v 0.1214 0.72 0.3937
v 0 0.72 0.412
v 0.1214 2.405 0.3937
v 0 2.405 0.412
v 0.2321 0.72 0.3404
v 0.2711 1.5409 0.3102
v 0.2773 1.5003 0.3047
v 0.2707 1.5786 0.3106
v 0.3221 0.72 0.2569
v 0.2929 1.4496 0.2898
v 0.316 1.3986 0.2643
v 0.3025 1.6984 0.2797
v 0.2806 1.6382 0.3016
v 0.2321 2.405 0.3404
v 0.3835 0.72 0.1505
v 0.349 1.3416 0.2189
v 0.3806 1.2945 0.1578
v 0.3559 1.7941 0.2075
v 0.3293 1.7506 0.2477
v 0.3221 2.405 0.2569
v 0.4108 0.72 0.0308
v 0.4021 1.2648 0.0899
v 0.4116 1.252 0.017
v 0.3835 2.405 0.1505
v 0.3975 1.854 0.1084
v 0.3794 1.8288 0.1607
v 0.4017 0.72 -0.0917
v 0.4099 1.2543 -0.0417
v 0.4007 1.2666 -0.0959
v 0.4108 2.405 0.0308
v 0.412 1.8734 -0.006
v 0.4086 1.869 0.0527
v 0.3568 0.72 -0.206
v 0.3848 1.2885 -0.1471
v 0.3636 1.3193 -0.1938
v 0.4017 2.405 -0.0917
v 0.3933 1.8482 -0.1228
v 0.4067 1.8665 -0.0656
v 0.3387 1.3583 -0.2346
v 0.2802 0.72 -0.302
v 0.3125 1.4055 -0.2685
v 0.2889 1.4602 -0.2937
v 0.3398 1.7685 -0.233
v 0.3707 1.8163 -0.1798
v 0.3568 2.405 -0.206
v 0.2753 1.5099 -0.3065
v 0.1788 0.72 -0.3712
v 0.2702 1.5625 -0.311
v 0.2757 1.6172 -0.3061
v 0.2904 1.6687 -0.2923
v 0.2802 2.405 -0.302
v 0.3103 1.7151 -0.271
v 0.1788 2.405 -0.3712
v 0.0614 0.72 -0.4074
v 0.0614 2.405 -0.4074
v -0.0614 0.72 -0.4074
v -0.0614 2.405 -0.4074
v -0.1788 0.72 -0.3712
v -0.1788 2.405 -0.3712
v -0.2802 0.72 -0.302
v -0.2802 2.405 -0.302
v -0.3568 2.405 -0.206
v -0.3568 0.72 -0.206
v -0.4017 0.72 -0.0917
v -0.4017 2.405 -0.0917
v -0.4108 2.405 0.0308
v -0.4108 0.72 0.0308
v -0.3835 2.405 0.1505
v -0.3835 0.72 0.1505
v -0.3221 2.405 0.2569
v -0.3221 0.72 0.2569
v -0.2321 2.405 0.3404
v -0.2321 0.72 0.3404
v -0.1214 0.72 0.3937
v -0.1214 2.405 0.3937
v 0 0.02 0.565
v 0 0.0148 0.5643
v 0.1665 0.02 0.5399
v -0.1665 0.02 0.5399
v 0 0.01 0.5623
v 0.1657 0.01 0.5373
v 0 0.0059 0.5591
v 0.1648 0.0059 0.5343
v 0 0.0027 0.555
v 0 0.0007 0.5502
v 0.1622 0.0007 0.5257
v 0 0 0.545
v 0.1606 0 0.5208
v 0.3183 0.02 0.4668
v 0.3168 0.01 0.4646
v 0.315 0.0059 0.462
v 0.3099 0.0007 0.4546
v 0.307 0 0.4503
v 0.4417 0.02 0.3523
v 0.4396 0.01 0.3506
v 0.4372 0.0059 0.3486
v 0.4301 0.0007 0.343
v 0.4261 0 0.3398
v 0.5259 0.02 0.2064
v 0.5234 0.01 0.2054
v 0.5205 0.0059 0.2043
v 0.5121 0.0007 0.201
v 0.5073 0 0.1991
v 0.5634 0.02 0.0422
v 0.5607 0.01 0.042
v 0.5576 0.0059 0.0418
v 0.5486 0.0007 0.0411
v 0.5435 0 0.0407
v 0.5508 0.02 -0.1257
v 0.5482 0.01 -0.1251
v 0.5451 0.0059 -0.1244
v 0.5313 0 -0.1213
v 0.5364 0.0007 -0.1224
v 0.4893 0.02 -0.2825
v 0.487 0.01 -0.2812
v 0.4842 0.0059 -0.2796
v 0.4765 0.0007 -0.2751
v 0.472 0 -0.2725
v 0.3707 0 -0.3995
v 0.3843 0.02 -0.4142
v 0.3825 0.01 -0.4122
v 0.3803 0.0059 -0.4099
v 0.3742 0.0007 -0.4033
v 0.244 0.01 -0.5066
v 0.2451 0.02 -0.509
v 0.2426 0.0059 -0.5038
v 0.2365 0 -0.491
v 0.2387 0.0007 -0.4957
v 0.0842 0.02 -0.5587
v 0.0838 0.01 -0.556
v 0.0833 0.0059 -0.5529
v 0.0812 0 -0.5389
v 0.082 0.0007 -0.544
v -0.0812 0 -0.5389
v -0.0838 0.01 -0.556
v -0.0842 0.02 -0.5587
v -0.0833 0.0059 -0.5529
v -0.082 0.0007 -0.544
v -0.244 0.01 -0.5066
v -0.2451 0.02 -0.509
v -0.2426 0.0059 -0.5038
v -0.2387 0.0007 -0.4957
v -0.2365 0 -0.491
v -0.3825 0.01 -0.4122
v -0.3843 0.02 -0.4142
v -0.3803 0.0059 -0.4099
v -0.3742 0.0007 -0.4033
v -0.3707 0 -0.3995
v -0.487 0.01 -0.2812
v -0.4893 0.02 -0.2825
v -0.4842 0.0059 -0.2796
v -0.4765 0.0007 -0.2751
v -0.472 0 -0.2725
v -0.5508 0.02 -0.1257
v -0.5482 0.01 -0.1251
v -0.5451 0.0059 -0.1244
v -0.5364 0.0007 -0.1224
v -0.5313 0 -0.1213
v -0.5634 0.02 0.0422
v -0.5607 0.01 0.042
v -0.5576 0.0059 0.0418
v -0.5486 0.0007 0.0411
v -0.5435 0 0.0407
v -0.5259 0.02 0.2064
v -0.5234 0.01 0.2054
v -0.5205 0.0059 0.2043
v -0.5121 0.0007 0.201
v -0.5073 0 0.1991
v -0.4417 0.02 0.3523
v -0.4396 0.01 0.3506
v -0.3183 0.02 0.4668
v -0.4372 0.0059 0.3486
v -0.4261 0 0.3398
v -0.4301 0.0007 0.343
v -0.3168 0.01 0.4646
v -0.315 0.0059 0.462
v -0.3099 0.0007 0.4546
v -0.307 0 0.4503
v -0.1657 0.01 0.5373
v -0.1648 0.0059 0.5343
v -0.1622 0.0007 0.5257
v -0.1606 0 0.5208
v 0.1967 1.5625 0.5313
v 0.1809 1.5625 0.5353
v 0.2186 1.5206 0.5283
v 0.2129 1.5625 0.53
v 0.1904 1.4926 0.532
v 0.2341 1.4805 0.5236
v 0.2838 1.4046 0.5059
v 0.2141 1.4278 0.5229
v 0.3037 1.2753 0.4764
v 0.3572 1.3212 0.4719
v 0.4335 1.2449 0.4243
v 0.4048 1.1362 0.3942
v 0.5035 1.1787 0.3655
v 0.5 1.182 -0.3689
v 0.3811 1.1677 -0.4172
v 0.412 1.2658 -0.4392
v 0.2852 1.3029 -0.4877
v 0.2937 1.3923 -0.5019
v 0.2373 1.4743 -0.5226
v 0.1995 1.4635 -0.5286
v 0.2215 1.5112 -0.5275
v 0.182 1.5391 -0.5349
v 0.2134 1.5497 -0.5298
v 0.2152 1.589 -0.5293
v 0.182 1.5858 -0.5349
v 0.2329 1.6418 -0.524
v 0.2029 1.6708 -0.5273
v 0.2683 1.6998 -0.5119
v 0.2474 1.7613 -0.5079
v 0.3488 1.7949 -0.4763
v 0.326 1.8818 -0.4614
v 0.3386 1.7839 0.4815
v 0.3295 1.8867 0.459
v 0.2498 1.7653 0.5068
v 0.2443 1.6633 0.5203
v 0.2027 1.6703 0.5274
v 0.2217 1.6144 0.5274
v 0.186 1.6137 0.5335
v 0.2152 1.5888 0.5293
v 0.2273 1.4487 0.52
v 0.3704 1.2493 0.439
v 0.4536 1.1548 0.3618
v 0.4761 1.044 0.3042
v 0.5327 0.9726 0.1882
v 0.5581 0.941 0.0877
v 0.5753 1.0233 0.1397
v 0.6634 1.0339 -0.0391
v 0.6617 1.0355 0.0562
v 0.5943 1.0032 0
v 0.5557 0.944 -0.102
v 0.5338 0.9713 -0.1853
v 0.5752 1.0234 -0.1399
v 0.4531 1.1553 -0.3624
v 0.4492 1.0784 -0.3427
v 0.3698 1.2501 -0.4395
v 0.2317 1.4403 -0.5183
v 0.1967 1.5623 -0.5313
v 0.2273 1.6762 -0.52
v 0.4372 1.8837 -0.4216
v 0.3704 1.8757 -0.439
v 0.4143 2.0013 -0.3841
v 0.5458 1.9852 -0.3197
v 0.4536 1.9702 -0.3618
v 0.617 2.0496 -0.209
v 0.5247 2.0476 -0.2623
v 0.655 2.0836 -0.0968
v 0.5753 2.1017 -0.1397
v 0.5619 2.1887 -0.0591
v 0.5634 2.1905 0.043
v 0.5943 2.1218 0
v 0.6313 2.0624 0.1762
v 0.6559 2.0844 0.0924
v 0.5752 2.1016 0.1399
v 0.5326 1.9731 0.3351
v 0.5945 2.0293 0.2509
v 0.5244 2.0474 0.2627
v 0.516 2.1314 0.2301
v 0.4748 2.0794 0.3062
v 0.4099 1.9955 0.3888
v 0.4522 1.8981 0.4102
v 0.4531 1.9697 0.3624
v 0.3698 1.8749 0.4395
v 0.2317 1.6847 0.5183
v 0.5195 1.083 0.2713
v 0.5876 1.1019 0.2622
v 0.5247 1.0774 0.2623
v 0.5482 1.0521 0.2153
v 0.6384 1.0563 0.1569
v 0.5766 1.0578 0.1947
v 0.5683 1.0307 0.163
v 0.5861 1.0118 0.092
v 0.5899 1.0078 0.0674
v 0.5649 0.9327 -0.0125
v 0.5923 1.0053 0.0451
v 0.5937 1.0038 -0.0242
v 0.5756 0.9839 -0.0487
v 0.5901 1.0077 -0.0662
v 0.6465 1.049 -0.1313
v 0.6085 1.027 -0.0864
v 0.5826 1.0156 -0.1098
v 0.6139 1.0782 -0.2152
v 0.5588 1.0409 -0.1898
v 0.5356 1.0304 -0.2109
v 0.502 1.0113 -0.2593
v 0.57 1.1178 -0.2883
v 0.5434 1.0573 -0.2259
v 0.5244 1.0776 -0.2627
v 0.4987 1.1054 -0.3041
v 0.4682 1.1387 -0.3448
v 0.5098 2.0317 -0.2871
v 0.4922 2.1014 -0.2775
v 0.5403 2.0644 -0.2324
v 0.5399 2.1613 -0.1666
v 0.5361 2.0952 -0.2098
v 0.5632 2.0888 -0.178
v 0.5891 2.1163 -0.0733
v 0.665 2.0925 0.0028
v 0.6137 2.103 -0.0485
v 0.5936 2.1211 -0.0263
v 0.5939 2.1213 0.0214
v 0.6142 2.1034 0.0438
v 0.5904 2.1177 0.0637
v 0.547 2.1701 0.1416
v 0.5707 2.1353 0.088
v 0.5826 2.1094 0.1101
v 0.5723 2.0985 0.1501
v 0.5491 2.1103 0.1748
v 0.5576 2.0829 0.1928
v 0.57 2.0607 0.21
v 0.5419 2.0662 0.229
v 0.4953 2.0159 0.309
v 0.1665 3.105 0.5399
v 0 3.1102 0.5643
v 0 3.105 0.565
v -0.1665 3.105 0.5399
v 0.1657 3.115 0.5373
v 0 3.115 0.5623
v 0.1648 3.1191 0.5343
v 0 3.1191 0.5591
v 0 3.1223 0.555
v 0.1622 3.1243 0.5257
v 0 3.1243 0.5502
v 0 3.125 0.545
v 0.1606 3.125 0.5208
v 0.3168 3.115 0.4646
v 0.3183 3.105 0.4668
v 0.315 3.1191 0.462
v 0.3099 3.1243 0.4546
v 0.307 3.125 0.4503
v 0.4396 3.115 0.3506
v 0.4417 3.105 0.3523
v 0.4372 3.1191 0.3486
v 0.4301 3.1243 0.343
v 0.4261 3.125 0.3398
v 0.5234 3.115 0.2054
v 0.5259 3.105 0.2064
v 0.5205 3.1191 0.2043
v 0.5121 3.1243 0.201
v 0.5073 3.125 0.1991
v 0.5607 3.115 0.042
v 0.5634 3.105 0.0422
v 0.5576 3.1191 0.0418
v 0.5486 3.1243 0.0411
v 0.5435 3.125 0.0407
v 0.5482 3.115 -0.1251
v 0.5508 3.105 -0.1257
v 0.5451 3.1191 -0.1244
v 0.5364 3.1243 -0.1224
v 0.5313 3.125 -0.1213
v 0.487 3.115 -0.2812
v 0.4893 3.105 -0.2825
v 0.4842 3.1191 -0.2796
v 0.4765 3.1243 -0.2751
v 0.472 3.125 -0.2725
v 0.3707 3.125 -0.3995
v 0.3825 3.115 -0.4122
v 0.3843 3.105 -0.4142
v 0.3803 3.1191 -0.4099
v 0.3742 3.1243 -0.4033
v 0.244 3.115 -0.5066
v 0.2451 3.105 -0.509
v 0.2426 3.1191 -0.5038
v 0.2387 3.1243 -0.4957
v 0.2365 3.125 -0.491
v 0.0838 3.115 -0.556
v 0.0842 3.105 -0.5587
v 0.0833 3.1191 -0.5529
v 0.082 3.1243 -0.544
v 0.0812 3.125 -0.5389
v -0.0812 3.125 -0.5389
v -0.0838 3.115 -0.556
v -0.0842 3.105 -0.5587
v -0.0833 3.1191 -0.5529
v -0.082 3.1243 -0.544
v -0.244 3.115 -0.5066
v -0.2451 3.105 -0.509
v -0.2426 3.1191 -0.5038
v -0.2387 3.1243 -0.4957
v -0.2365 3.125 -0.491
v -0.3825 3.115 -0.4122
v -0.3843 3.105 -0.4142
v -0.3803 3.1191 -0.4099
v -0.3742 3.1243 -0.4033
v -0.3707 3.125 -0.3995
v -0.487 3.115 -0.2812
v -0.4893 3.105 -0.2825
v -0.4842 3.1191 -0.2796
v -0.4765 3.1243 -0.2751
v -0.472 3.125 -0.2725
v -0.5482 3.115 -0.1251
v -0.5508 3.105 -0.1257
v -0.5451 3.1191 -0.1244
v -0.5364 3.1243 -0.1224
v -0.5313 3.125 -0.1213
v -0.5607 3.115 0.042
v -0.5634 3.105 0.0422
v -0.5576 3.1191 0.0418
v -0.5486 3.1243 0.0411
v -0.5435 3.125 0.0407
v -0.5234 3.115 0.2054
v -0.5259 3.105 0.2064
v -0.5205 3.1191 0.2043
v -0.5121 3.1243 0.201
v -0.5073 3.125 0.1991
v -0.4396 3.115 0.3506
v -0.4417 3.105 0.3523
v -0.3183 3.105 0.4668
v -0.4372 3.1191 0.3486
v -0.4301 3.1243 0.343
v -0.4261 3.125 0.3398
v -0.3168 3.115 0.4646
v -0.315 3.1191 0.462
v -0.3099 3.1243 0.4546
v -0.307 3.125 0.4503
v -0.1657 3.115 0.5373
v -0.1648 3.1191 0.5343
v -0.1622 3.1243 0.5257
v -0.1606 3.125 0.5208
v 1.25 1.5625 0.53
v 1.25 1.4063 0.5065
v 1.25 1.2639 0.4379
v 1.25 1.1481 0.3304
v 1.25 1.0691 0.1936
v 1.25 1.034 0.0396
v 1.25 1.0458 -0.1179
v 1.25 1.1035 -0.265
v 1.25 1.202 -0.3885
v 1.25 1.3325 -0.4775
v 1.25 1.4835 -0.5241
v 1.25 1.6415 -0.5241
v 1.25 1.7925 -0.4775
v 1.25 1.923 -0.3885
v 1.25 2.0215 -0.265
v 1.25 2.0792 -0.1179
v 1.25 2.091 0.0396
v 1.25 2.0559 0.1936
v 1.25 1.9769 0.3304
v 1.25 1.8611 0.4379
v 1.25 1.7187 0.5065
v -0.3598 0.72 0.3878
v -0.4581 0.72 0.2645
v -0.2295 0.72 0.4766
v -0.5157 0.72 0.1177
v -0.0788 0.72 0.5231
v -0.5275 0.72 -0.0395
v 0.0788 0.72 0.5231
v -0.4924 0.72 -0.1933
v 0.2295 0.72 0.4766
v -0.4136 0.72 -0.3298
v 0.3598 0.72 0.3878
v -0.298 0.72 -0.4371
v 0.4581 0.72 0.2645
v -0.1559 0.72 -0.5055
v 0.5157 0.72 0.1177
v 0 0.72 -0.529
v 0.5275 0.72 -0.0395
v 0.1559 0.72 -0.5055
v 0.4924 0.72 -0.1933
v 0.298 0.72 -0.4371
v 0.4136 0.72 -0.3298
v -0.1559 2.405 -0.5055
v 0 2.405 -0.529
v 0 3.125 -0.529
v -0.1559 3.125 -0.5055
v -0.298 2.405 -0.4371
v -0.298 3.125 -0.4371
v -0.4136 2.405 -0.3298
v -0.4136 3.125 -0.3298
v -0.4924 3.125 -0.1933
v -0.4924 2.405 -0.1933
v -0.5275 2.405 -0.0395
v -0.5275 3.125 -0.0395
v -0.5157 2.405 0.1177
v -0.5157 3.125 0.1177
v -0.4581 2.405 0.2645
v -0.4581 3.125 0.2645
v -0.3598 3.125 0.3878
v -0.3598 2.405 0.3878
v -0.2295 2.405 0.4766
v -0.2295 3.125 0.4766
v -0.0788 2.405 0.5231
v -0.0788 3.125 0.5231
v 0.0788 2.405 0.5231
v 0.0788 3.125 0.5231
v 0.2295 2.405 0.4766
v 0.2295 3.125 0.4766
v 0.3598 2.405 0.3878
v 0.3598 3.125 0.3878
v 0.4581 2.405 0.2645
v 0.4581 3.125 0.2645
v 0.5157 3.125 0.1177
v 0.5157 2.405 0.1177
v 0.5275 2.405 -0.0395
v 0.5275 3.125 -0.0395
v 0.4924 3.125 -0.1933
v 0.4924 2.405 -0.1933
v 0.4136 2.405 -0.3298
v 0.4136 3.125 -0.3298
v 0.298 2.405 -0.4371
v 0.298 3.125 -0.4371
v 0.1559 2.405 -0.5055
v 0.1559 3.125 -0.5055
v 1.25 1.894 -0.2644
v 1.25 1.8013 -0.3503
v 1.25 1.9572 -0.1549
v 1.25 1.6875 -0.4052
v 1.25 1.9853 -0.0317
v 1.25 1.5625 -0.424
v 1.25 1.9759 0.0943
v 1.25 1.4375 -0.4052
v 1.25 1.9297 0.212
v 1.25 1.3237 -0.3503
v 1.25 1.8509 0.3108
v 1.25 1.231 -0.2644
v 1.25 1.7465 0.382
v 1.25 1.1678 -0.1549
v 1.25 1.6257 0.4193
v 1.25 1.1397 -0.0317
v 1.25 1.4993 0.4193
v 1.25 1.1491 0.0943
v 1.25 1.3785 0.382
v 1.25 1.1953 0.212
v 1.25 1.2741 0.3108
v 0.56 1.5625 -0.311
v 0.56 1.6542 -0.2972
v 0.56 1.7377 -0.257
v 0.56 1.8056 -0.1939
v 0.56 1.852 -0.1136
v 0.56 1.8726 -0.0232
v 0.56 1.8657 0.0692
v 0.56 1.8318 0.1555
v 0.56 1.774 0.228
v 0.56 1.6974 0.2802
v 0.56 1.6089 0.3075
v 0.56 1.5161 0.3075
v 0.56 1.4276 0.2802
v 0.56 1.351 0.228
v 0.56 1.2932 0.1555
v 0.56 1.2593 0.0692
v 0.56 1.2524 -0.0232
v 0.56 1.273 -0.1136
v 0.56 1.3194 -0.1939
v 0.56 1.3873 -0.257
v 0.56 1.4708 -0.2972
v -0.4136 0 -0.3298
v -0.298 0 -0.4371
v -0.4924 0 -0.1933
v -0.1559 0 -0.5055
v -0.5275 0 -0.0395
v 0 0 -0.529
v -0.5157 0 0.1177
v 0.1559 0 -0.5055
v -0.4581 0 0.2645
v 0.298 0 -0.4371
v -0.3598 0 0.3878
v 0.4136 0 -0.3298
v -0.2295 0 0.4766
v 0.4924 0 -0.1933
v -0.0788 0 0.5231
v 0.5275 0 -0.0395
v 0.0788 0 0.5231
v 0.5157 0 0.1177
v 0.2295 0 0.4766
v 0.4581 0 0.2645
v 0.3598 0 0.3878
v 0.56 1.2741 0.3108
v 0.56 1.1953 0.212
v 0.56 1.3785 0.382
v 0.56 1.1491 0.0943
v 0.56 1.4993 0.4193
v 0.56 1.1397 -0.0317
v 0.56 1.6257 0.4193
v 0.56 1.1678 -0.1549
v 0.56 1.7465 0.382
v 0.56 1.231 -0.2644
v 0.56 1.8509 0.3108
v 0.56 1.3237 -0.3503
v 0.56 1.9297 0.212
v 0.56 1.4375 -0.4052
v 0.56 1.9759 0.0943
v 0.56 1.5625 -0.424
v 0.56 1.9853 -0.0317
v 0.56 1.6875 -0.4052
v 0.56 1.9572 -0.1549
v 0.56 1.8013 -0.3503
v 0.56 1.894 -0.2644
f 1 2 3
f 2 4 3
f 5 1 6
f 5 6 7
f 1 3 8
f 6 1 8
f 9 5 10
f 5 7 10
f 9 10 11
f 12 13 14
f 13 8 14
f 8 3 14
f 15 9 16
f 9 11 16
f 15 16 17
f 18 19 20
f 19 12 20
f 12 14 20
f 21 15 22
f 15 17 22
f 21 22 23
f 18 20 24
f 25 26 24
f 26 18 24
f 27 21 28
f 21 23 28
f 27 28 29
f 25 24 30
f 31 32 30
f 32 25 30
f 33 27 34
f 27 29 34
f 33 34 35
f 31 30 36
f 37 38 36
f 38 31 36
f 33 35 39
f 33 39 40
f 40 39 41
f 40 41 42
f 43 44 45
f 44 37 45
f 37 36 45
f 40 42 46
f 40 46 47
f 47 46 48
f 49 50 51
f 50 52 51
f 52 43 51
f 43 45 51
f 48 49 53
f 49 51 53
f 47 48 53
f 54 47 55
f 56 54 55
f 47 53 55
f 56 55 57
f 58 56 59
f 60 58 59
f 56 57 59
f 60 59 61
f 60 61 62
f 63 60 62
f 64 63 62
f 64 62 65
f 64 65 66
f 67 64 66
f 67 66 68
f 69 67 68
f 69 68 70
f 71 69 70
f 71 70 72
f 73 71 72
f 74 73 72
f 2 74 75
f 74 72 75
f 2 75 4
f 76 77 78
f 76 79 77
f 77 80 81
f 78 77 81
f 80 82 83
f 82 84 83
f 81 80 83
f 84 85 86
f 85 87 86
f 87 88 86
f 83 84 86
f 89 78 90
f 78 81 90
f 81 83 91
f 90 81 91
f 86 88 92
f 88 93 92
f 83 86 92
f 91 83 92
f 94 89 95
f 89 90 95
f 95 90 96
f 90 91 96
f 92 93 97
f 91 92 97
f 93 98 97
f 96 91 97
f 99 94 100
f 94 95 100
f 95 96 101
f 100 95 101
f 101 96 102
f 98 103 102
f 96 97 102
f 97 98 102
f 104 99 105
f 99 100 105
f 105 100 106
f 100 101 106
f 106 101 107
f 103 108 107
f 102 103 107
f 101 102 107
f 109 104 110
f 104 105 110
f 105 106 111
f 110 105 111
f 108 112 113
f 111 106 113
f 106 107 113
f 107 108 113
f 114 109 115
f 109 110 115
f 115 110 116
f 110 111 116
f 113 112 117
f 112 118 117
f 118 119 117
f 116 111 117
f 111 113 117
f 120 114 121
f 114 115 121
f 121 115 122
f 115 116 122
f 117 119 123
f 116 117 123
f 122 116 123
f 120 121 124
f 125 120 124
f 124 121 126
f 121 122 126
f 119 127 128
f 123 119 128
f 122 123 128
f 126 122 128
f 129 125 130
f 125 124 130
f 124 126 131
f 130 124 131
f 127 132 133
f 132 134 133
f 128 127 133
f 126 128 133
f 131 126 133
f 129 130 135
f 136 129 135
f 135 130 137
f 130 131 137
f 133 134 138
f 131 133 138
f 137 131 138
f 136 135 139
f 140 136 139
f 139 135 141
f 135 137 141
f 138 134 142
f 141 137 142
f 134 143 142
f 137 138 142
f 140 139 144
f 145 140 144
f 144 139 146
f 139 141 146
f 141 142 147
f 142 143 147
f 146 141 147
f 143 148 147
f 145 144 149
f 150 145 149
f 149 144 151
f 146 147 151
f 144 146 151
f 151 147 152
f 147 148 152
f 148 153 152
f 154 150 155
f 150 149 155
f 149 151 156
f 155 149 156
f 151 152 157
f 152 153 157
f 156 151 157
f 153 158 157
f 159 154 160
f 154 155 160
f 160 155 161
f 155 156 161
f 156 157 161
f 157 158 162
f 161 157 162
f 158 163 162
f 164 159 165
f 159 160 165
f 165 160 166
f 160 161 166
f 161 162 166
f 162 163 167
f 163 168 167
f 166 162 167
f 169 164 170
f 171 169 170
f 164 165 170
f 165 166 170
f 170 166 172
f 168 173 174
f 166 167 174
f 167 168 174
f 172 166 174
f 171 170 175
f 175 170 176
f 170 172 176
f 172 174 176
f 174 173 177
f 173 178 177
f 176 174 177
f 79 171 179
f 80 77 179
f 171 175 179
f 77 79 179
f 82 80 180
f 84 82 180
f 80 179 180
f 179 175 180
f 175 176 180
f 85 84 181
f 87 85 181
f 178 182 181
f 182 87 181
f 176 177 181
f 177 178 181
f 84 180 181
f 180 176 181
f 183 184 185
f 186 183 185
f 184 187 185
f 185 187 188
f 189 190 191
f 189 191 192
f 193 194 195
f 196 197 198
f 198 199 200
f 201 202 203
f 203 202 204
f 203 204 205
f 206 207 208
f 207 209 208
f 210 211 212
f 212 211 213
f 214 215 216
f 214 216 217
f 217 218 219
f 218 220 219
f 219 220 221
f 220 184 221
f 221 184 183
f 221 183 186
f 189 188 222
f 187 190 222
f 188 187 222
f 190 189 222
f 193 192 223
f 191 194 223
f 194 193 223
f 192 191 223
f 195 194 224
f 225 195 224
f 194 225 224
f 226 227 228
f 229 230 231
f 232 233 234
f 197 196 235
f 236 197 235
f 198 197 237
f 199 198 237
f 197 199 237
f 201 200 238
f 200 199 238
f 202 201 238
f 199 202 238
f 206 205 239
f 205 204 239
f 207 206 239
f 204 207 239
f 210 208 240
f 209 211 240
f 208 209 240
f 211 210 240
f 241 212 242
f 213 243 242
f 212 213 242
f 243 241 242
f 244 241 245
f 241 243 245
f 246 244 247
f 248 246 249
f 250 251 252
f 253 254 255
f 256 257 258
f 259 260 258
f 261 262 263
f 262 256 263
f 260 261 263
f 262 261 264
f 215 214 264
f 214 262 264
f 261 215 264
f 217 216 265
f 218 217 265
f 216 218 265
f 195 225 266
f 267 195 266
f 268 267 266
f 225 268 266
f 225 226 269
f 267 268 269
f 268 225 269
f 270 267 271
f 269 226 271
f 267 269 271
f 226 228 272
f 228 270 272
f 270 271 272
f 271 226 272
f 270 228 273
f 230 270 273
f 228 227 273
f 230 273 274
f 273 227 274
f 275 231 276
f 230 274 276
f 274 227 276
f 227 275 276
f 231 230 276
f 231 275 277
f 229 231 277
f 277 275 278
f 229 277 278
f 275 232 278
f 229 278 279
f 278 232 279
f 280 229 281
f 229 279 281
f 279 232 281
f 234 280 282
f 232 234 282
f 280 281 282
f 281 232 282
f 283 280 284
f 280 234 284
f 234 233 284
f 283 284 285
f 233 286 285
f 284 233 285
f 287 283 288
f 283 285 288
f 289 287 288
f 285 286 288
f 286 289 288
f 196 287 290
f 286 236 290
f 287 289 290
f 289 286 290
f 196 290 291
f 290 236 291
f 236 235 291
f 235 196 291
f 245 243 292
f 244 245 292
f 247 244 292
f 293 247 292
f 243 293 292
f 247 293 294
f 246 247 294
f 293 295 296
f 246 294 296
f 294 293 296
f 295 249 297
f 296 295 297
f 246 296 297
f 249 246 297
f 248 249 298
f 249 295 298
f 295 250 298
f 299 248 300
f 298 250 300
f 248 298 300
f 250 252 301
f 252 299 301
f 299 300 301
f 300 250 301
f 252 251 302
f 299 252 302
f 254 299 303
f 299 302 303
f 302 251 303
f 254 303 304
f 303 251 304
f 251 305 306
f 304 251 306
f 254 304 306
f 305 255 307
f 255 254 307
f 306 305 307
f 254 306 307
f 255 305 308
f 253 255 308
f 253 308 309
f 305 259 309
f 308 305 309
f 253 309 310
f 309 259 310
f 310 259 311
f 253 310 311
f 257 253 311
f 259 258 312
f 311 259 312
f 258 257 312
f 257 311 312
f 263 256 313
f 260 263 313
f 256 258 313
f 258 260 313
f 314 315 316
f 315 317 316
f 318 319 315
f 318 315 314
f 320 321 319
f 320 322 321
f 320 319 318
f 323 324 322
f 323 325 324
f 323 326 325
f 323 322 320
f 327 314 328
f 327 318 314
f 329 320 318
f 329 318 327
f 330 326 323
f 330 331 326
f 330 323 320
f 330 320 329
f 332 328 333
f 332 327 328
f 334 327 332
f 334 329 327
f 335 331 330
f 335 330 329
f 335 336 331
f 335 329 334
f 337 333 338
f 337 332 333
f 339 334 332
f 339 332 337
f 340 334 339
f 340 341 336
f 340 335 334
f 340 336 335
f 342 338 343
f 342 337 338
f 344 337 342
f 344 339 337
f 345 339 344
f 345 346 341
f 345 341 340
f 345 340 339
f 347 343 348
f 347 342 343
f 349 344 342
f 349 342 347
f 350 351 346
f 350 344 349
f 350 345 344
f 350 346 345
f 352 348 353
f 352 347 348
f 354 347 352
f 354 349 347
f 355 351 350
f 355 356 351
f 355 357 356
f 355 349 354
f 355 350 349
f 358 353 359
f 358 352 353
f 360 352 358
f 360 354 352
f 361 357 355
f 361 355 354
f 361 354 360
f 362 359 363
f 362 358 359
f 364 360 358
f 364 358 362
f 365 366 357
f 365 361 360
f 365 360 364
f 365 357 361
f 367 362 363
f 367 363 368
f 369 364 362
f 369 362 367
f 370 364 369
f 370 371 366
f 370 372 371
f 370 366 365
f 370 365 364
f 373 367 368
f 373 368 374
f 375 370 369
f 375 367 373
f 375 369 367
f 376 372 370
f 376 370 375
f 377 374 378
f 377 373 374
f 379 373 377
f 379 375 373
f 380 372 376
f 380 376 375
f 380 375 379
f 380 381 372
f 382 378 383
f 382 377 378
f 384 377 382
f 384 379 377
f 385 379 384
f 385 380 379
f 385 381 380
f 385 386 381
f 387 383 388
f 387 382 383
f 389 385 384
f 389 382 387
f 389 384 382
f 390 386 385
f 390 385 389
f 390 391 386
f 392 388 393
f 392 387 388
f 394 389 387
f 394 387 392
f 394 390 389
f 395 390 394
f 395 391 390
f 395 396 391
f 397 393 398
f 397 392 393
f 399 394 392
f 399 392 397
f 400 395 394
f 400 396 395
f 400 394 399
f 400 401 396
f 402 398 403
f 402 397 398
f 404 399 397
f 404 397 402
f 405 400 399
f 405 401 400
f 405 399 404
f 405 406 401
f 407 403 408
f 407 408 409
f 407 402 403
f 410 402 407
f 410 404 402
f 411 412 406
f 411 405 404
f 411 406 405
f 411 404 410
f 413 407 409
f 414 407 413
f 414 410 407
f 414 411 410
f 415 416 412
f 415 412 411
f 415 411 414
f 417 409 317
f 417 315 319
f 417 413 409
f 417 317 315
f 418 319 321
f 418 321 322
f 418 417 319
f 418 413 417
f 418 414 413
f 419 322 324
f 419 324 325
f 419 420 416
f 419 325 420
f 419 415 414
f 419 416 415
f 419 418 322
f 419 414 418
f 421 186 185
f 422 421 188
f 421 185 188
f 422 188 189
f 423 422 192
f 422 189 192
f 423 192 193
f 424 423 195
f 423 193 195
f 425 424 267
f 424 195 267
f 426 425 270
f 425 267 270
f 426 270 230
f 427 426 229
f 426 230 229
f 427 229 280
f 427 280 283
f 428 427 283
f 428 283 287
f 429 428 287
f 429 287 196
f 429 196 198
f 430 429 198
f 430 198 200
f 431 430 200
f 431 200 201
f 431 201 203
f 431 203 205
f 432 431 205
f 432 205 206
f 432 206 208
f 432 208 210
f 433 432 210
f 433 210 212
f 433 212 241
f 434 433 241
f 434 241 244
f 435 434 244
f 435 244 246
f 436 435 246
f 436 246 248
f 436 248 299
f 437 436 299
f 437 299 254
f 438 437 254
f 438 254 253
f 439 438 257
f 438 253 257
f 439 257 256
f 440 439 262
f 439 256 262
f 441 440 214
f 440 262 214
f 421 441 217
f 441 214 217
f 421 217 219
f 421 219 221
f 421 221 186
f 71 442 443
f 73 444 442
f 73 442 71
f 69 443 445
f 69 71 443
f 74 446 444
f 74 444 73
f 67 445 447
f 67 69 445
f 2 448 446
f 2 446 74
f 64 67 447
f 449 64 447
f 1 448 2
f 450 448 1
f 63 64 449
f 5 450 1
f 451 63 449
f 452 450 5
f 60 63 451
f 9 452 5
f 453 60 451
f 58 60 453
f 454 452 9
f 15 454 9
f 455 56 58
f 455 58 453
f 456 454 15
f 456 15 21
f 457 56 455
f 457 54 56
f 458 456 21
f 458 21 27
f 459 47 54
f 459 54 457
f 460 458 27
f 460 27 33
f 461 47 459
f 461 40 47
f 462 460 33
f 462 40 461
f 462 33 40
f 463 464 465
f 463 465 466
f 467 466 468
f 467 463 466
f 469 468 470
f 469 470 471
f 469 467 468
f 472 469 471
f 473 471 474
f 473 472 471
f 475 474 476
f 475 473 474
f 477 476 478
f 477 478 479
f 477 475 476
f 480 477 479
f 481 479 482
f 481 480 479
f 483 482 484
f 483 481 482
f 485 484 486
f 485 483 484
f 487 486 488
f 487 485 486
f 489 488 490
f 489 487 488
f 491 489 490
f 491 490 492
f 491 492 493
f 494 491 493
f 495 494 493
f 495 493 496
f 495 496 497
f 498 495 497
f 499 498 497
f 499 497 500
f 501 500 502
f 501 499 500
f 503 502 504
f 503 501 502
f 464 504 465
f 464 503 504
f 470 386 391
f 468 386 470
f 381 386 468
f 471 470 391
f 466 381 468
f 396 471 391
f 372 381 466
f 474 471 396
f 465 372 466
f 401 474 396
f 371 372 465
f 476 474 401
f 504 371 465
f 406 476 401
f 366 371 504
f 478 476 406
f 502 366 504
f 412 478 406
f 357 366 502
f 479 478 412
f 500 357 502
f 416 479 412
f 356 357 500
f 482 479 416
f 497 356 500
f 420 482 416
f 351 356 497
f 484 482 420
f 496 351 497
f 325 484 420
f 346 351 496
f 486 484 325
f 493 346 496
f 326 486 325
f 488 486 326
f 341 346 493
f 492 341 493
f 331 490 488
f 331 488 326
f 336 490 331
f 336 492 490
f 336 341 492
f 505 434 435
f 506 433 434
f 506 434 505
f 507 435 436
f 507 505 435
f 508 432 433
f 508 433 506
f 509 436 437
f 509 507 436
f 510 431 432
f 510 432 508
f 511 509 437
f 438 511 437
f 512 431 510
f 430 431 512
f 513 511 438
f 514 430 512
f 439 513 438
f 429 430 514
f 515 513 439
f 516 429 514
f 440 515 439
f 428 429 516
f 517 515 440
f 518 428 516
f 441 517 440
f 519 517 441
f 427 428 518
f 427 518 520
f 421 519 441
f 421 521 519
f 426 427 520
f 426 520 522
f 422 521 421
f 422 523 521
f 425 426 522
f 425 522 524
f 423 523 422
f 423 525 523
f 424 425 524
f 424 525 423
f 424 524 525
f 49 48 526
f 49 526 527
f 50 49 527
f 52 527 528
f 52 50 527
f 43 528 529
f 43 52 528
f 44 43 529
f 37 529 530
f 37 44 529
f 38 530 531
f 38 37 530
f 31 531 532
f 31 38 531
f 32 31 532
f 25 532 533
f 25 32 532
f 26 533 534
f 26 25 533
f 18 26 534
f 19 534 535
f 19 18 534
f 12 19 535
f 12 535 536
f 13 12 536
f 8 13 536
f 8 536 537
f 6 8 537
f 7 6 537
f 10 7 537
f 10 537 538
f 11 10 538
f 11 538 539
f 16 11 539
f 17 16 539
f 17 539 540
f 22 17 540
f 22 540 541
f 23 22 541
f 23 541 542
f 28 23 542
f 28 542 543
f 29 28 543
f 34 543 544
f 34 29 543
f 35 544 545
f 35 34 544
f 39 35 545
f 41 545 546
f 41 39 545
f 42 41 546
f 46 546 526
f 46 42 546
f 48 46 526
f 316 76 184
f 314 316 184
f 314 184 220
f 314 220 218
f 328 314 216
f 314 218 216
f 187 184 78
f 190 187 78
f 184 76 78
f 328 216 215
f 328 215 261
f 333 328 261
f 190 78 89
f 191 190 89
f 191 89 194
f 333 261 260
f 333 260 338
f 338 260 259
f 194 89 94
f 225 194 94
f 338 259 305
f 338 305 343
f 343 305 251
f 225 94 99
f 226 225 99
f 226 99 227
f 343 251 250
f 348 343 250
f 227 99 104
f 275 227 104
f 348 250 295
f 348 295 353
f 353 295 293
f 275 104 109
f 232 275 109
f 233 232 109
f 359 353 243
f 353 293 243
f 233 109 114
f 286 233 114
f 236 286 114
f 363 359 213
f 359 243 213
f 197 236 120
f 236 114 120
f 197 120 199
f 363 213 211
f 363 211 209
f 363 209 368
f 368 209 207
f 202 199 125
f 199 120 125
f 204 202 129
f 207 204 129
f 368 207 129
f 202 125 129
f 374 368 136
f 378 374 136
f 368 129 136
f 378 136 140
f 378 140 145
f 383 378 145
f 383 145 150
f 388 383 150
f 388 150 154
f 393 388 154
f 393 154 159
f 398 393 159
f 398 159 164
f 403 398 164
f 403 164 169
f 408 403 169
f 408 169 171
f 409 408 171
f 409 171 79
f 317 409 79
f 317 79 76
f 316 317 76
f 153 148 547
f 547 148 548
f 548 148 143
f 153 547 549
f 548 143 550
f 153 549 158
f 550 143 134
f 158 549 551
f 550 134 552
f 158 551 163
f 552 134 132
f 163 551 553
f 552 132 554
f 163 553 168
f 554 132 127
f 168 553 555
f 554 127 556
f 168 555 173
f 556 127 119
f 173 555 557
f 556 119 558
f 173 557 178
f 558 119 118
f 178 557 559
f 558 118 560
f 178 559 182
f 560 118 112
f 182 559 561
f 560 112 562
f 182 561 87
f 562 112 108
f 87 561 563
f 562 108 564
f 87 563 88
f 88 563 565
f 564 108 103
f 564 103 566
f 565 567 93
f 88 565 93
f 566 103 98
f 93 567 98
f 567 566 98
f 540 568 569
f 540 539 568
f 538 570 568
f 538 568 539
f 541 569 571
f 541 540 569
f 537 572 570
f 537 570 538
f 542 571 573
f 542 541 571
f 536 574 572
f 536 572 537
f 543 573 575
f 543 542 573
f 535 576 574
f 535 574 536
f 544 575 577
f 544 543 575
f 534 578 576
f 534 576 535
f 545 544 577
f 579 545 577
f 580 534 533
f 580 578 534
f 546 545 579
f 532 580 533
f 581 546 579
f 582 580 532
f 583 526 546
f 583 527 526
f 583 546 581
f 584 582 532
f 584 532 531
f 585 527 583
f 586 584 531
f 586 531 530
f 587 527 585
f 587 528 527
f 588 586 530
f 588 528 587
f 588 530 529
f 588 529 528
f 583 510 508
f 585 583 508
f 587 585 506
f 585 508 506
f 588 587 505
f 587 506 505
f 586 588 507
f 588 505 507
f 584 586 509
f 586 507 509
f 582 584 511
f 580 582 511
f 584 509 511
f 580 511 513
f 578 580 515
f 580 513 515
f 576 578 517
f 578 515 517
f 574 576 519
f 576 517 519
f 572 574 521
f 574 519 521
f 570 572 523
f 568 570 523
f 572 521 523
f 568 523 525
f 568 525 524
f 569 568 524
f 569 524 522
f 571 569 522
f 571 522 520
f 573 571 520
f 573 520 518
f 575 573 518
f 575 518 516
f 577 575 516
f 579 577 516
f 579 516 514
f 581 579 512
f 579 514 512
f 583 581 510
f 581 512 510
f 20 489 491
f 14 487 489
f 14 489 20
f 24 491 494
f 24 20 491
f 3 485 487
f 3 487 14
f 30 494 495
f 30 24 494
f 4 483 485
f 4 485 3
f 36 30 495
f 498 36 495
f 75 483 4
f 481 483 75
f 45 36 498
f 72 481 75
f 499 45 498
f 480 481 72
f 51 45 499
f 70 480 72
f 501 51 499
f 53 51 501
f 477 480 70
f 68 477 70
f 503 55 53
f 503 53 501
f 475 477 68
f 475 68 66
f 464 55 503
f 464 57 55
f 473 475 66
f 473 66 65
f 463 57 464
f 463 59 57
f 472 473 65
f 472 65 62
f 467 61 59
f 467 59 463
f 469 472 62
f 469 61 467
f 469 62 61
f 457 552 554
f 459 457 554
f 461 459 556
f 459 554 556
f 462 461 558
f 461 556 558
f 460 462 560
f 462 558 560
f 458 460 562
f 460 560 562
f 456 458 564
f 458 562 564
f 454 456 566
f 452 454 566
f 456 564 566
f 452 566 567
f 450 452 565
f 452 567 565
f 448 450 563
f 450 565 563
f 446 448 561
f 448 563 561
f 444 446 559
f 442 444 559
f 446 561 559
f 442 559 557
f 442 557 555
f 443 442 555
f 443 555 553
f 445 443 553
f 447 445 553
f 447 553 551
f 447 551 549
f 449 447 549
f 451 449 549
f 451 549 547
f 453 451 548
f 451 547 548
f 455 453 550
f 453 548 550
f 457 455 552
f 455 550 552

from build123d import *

# Parameters (mm, degrees)
SKETCH1_R           = 0.565
BOSS_EXTRUDE1_DEPTH = 3.125
SKETCH3_R           = 0.529
CUT_EXTRUDE2_DEPTH  = 0.72
CUT_EXTRUDE3_START  = -0.72
SKETCH4_R           = 0.529
CUT_EXTRUDE3_DEPTH  = 0.72
SKETCH5_R           = 0.53
BOSS_EXTRUDE2_DEPTH = 1.25
SKETCH6_R           = 0.311
CUT_EXTRUDE8_DEPTH  = 1.25
SKETCH9_R           = 0.424
CUT_EXTRUDE10_DEPTH = 0.69
SKETCH10_R          = 0.412
CUT_EXTRUDE12_DEPTH = 4.0625
FILLET1_R           = 0.02
FILLET2_R           = 0.1


with BuildPart() as part:
    # Sketch1 → Boss-Extrude1 (new body)
    with BuildSketch(Plane(origin=(0, 0, 0), x_dir=(1, 0, 0), z_dir=(0, 1, 0))):
        with Locations(Location((0, 0, 0), (0, 0, 270))):
            Circle(SKETCH1_R)
    extrude(amount=BOSS_EXTRUDE1_DEPTH)

    # Sketch3 → Cut-Extrude2 (cut)
    with BuildSketch(Plane.XZ):
        with Locations(Location((0, 0, 0), (0, 0, 270))):
            Circle(SKETCH3_R)
    extrude(amount=-CUT_EXTRUDE2_DEPTH, mode=Mode.SUBTRACT)

    # Sketch4 → Cut-Extrude3 (cut)
    with BuildSketch(Plane(origin=(0, 3.125, 0), x_dir=(1, 0, 0), z_dir=(0, 1, 0)).offset(CUT_EXTRUDE3_START)):
        with Locations(Location((0, 0, 0), (0, 0, 90))):
            Circle(SKETCH4_R)
    extrude(amount=CUT_EXTRUDE3_DEPTH, mode=Mode.SUBTRACT)

    # Sketch5 → Boss-Extrude2 (add)
    with BuildSketch(Plane(origin=(0, 0, 0), x_dir=(0, 0, -1), z_dir=(1, 0, 0))):
        with Locations(Location((0, 1.5625, 0), (0, 0, 180))):
            Circle(SKETCH5_R)
    extrude(amount=BOSS_EXTRUDE2_DEPTH)

    # Sketch6 → Cut-Extrude8 (cut)
    with BuildSketch(Plane(origin=(0, 0, 0), x_dir=(0, 0, -1), z_dir=(1, 0, 0))):
        with Locations((0, 1.5625)):
            Circle(SKETCH6_R)
    extrude(amount=CUT_EXTRUDE8_DEPTH, mode=Mode.SUBTRACT)

    # Sketch9 → Cut-Extrude10 (cut)
    with BuildSketch(Plane(origin=(1.25, 0, 0), x_dir=(0, 0, -1), z_dir=(1, 0, 0))):
        with Locations((0, 1.5625)):
            Circle(SKETCH9_R)
    extrude(amount=-CUT_EXTRUDE10_DEPTH, mode=Mode.SUBTRACT)

    # Sketch10 → Cut-Extrude12 (cut, symmetric)
    with BuildSketch(Plane(origin=(0, 2.405, 0), x_dir=(1, 0, 0), z_dir=(0, 1, 0))):
        with Locations(Location((0, 0, 0), (0, 0, 270))):
            Circle(SKETCH10_R)
    extrude(amount=CUT_EXTRUDE12_DEPTH, both=True, mode=Mode.SUBTRACT)

    # Fillet1
    fillet1_edges = [part.edges().sort_by_distance(p)[0] for p in [
        (0, 0, -0.565),
        (0, 3.125, -0.565),
    ]]
    fillet(fillet1_edges, radius=FILLET1_R)

    # Fillet2
    fillet2_edges = [part.edges().sort_by_distance(p)[0] for p in [
        (0.19576772, 1.5625, -0.53),
    ]]
    fillet(fillet2_edges, radius=FILLET2_R)


solid = part.part
